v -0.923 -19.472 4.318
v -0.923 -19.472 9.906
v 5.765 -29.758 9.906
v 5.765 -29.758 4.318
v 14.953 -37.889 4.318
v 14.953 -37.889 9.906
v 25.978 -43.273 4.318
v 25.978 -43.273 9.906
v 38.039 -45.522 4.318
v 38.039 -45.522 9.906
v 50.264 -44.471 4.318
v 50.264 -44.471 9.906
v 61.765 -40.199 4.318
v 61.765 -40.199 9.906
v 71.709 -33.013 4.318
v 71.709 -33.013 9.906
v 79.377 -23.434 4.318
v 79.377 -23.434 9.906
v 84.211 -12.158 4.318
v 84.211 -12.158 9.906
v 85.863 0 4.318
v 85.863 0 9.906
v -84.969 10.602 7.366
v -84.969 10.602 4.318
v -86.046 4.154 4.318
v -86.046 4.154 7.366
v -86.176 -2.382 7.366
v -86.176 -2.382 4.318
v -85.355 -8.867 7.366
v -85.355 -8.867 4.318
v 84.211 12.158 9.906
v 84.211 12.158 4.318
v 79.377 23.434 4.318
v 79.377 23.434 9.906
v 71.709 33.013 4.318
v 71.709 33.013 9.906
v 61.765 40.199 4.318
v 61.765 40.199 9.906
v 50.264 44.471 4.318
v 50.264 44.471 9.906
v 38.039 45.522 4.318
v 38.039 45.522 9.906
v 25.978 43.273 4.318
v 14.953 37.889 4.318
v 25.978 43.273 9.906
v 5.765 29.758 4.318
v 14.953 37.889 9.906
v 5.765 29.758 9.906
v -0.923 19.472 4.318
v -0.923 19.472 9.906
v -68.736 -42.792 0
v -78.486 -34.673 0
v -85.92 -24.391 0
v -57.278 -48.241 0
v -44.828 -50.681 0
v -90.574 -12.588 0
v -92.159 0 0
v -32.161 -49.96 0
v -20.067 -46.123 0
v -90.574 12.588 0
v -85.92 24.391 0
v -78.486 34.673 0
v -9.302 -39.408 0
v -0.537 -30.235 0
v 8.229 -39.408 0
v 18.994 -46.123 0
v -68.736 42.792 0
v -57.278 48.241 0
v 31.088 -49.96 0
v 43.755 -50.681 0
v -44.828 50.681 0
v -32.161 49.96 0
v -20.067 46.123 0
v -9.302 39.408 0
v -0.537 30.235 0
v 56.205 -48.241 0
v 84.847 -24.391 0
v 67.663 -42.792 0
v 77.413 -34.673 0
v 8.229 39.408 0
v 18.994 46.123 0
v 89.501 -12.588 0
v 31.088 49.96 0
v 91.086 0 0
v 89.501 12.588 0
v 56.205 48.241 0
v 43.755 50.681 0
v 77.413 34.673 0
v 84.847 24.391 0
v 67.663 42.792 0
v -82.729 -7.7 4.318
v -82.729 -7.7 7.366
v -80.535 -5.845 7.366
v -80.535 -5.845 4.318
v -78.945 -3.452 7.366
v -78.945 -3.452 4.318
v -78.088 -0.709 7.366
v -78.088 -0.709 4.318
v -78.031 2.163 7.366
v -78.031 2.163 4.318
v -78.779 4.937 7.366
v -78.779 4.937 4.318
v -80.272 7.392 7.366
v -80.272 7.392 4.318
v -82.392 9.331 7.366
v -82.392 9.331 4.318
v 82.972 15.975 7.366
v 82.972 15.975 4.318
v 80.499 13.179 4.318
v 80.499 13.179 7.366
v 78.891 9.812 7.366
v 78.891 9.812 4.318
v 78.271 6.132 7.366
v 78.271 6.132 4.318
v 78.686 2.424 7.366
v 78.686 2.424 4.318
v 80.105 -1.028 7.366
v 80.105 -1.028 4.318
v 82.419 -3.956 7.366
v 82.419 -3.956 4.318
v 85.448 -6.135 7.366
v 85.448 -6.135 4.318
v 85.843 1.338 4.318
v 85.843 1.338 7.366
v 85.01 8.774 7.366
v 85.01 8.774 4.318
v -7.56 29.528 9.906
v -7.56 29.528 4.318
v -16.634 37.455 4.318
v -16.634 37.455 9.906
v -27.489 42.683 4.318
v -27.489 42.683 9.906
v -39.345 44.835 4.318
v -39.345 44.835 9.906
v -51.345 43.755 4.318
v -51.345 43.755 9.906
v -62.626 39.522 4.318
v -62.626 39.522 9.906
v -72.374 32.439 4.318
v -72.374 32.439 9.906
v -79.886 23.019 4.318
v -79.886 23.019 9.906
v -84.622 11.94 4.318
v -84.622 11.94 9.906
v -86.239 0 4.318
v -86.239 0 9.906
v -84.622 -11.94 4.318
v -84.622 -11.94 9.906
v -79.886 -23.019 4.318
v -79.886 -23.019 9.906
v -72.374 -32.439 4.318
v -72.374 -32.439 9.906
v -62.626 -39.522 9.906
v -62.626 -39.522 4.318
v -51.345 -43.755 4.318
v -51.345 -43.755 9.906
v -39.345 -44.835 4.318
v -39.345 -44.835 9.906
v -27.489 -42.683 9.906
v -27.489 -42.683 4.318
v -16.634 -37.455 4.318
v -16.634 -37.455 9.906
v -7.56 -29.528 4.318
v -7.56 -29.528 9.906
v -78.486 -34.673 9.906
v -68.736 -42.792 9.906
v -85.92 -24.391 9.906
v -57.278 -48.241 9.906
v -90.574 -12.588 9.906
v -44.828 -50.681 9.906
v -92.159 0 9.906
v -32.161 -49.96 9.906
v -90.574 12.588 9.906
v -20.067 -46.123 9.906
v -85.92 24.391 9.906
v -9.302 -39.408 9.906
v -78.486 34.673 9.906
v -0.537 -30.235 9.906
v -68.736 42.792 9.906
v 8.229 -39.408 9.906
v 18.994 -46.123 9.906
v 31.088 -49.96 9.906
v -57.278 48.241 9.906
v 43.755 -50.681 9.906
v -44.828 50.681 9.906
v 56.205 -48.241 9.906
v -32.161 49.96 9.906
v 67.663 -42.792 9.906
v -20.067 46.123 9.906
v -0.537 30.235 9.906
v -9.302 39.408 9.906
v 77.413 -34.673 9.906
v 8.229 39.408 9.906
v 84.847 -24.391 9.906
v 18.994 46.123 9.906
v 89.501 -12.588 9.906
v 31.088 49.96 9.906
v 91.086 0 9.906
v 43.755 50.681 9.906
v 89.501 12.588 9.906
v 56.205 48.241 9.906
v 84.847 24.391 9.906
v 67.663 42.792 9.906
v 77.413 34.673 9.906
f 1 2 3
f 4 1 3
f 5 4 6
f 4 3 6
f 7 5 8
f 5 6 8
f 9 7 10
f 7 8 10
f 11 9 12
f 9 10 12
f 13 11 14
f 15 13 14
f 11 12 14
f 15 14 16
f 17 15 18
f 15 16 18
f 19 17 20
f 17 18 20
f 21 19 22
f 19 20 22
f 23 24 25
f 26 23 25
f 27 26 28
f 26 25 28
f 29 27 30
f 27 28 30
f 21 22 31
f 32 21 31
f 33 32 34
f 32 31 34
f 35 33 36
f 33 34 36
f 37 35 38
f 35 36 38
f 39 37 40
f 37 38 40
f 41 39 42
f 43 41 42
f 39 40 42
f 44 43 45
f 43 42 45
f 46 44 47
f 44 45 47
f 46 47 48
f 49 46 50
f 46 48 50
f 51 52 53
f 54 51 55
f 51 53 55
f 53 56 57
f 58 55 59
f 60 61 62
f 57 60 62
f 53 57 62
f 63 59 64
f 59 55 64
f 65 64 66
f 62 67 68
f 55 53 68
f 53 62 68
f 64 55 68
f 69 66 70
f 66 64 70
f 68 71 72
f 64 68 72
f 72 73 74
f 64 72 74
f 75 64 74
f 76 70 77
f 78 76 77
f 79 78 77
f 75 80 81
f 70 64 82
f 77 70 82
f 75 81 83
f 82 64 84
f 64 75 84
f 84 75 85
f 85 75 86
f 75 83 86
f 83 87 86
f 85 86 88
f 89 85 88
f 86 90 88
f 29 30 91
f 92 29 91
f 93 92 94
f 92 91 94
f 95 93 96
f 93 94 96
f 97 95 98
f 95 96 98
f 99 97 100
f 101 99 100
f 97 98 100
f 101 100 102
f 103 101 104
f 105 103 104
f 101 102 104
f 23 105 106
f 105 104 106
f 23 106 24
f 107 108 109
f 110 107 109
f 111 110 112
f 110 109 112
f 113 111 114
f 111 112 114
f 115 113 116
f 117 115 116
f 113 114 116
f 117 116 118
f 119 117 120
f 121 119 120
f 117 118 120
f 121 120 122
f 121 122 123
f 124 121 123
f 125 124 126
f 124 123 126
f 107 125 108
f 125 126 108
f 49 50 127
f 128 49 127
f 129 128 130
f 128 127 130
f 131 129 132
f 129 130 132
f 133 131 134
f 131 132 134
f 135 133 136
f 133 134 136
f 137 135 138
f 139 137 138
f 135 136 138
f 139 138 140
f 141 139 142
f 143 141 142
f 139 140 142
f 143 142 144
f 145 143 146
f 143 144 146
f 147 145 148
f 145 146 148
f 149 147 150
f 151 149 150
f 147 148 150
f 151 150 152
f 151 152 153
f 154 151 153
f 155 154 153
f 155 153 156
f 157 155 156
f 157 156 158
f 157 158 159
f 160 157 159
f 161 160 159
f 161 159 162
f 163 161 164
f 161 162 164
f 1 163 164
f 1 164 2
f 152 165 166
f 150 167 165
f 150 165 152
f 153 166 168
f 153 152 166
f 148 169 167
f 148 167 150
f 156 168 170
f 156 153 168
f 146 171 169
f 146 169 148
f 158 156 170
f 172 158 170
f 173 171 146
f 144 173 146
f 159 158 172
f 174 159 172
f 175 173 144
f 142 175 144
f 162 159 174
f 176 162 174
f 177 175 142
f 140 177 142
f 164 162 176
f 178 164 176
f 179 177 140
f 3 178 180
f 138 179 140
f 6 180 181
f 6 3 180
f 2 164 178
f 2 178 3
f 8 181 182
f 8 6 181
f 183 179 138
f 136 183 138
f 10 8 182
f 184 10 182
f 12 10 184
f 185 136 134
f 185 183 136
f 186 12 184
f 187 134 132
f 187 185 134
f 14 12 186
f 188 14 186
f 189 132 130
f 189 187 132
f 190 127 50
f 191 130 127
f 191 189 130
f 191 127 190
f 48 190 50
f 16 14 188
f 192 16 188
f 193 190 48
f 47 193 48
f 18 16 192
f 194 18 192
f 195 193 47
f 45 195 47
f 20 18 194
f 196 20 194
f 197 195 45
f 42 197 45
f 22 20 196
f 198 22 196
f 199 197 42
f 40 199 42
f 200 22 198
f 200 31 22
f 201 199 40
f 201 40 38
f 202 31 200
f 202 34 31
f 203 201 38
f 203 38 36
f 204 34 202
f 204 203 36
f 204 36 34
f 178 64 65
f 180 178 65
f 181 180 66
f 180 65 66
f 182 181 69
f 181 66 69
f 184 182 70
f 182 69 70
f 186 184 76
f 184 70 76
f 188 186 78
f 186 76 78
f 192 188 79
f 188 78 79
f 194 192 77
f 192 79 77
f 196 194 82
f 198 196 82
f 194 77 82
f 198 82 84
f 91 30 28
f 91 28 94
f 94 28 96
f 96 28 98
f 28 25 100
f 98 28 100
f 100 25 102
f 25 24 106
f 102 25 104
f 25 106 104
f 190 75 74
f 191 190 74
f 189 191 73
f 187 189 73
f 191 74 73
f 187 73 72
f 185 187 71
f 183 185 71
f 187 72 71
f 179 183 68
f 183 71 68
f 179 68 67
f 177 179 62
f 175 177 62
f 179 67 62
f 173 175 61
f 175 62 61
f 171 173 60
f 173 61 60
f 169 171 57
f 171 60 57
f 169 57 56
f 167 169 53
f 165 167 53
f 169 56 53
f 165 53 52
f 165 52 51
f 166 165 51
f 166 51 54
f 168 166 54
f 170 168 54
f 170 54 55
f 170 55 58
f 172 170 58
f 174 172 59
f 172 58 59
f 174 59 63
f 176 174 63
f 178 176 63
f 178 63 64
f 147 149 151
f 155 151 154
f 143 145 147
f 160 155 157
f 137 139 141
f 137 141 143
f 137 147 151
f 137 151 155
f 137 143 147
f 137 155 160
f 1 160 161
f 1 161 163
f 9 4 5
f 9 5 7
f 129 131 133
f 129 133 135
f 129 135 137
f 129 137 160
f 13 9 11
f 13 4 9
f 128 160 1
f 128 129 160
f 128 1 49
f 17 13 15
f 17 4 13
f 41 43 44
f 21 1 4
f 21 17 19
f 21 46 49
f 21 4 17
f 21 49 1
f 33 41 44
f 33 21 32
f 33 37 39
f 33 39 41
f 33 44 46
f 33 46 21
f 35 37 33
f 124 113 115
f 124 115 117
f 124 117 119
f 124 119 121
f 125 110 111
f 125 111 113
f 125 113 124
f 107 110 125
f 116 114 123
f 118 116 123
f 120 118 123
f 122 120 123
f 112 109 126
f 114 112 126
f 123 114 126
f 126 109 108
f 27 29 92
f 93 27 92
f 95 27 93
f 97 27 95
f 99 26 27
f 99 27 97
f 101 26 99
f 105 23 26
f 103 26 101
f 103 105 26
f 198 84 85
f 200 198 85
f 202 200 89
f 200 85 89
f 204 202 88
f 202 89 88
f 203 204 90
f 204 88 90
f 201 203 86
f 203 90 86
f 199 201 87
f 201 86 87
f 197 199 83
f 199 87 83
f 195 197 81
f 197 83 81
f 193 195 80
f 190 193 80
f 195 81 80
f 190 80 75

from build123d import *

# Parameters (mm, degrees)
F1_DEPTH = 9.906
F3_DEPTH = 5.588
F5_DEPTH = 3.048


with BuildPart() as f1:
    # F0 (on Top) → F1 (new body)
    with BuildSketch(Plane.XY):
        with BuildLine():
            ThreePointArc((-0.536563, -30.235408), (-10.514264, 0), (-0.536563, 30.235408))
            ThreePointArc((-0.536563, 30.235408), (-92.158862, 0), (-0.536563, -30.235408))
        make_face()
        with BuildLine():
            ThreePointArc((-0.536563, 30.235408), (6.882265, 15.919598), (9.441138, 0))
            ThreePointArc((9.441138, 0), (6.882265, -15.919598), (-0.536563, -30.235408))
            ThreePointArc((-0.536563, -30.235408), (56.205334, -48.241128), (91.085736, 0))
            ThreePointArc((91.085736, 0), (56.205334, 48.241128), (-0.536563, 30.235408))
        make_face()
        with BuildLine():
            ThreePointArc((-0.536563, -30.235408), (6.882265, -15.919598), (9.441138, 0))
            ThreePointArc((9.441138, 0), (6.882265, 15.919598), (-0.536563, 30.235408))
            ThreePointArc((-0.536563, 30.235408), (-10.514264, 0), (-0.536563, -30.235408))
        make_face()
    extrude(amount=F1_DEPTH)

    # F2 (on face) → F3 (cut)
    with BuildSketch(Plane.XY.offset(9.906)):
        with BuildLine():
            ThreePointArc((-0.922572, 19.471608), (2.396297, 9.986144), (3.52139, 0))
            ThreePointArc((3.52139, 0), (2.396297, -9.986144), (-0.922572, -19.471608))
            ThreePointArc((-0.922572, -19.471608), (50.26358, -44.471461), (85.862794, 0))
            ThreePointArc((85.862794, 0), (50.26358, 44.471461), (-0.922572, 19.471608))
        make_face()
        with BuildLine():
            ThreePointArc((-0.922572, -19.471608), (-5.291322, 0), (-0.922572, 19.471608))
            ThreePointArc((-0.922572, 19.471608), (-86.239114, 0), (-0.922572, -19.471608))
        make_face()
        with BuildLine():
            ThreePointArc((-0.922572, -19.471608), (2.396297, -9.986144), (3.52139, 0))
            ThreePointArc((3.52139, 0), (2.396297, 9.986144), (-0.922572, 19.471608))
            ThreePointArc((-0.922572, 19.471608), (-5.291322, 0), (-0.922572, -19.471608))
        make_face()
    extrude(amount=-F3_DEPTH, mode=Mode.SUBTRACT)


with BuildPart() as f5:
    # F4 (on face) → F5 (new body)
    with BuildSketch(Plane.XY.offset(4.318)):
        with BuildLine():
            ThreePointArc((-84.968977, 10.601649), (-86.230317, 0.888606), (-85.354517, -8.866761))
            ThreePointArc((-85.354517, -8.866761), (-77.957834, 0.724783), (-84.968977, 10.601649))
        make_face()
        with BuildLine():
            ThreePointArc((82.971562, 15.97462), (78.348908, 4.263356), (85.448001, -6.134986))
            ThreePointArc((85.448001, -6.134986), (85.57956, 5.073242), (82.971562, 15.97462))
        make_face()
    extrude(amount=F5_DEPTH)


solid = Compound([f1.part, f5.part])
